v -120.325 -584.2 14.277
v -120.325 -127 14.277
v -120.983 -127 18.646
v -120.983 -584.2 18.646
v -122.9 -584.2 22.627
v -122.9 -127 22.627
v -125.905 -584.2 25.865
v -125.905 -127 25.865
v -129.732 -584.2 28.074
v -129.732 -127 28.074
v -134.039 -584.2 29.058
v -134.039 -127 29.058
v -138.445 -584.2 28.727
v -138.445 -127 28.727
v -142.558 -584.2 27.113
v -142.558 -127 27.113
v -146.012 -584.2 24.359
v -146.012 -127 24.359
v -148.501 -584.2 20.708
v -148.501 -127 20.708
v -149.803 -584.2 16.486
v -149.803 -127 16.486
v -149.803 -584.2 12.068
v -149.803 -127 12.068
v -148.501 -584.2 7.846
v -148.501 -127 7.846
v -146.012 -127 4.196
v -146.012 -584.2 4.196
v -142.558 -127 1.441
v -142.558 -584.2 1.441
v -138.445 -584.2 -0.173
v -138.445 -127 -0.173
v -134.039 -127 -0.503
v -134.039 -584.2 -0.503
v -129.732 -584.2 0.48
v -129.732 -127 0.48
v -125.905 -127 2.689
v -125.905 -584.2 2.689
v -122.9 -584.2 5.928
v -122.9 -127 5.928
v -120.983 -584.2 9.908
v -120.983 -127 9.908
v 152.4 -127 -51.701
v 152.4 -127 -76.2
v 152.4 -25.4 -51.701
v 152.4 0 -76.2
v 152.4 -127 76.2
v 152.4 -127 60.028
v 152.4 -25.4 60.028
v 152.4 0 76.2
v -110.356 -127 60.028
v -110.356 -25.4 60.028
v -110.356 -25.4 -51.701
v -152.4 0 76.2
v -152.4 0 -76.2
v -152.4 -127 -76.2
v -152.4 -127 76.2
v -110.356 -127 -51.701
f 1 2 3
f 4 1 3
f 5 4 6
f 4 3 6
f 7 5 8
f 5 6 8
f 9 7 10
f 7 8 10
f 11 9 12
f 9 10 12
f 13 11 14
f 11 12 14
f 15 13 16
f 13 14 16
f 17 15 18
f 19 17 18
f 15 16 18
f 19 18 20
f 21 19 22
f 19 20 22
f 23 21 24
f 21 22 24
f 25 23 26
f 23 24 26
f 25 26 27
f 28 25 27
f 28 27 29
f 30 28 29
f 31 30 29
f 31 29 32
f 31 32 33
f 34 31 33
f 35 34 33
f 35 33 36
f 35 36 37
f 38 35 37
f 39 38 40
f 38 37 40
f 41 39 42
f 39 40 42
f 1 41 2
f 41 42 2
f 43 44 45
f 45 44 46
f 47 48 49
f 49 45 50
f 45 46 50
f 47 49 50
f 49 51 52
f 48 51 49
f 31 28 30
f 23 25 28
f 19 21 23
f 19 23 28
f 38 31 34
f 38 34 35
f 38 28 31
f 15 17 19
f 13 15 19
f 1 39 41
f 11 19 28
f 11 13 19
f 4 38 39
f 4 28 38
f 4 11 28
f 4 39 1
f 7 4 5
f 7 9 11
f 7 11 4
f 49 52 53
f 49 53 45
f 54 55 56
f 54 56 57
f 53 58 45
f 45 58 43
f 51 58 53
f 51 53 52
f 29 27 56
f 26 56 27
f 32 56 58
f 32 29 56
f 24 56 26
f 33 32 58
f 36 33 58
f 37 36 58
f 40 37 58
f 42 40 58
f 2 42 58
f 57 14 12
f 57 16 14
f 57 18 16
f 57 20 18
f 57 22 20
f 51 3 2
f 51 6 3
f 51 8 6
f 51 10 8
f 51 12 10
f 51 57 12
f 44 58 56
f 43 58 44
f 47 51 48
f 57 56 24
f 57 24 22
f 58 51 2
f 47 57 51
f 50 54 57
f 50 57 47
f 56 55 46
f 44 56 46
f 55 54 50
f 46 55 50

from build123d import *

# Parameters (mm, degrees)
F0_W     = 304.8
F0_H     = 152.4
F1_DEPTH = 127
F2_W     = 262.756182
F2_H     = 111.728583
F3_DEPTH = 101.6
F4_R     = 14.821854
F5_DEPTH = 457.2


with BuildPart() as f1:
    # F0 (on Front) → F1 (new body)
    with BuildSketch(Plane.XZ):
        Rectangle(F0_W, F0_H)
    extrude(amount=F1_DEPTH)

    # F2 (on face) → F3 (cut, symmetric)
    with BuildSketch(Plane.XZ.offset(127)):
        with Locations((21.021909, 4.163234)):
            Rectangle(F2_W, F2_H)
    extrude(amount=F3_DEPTH, both=True, mode=Mode.SUBTRACT)

    # F4 (on face) → F5 (join)
    with BuildSketch(Plane.XZ.offset(127)):
        with Locations((-135.146677, 14.277183)):
            Circle(F4_R)
    extrude(amount=F5_DEPTH)


solid = f1.part
